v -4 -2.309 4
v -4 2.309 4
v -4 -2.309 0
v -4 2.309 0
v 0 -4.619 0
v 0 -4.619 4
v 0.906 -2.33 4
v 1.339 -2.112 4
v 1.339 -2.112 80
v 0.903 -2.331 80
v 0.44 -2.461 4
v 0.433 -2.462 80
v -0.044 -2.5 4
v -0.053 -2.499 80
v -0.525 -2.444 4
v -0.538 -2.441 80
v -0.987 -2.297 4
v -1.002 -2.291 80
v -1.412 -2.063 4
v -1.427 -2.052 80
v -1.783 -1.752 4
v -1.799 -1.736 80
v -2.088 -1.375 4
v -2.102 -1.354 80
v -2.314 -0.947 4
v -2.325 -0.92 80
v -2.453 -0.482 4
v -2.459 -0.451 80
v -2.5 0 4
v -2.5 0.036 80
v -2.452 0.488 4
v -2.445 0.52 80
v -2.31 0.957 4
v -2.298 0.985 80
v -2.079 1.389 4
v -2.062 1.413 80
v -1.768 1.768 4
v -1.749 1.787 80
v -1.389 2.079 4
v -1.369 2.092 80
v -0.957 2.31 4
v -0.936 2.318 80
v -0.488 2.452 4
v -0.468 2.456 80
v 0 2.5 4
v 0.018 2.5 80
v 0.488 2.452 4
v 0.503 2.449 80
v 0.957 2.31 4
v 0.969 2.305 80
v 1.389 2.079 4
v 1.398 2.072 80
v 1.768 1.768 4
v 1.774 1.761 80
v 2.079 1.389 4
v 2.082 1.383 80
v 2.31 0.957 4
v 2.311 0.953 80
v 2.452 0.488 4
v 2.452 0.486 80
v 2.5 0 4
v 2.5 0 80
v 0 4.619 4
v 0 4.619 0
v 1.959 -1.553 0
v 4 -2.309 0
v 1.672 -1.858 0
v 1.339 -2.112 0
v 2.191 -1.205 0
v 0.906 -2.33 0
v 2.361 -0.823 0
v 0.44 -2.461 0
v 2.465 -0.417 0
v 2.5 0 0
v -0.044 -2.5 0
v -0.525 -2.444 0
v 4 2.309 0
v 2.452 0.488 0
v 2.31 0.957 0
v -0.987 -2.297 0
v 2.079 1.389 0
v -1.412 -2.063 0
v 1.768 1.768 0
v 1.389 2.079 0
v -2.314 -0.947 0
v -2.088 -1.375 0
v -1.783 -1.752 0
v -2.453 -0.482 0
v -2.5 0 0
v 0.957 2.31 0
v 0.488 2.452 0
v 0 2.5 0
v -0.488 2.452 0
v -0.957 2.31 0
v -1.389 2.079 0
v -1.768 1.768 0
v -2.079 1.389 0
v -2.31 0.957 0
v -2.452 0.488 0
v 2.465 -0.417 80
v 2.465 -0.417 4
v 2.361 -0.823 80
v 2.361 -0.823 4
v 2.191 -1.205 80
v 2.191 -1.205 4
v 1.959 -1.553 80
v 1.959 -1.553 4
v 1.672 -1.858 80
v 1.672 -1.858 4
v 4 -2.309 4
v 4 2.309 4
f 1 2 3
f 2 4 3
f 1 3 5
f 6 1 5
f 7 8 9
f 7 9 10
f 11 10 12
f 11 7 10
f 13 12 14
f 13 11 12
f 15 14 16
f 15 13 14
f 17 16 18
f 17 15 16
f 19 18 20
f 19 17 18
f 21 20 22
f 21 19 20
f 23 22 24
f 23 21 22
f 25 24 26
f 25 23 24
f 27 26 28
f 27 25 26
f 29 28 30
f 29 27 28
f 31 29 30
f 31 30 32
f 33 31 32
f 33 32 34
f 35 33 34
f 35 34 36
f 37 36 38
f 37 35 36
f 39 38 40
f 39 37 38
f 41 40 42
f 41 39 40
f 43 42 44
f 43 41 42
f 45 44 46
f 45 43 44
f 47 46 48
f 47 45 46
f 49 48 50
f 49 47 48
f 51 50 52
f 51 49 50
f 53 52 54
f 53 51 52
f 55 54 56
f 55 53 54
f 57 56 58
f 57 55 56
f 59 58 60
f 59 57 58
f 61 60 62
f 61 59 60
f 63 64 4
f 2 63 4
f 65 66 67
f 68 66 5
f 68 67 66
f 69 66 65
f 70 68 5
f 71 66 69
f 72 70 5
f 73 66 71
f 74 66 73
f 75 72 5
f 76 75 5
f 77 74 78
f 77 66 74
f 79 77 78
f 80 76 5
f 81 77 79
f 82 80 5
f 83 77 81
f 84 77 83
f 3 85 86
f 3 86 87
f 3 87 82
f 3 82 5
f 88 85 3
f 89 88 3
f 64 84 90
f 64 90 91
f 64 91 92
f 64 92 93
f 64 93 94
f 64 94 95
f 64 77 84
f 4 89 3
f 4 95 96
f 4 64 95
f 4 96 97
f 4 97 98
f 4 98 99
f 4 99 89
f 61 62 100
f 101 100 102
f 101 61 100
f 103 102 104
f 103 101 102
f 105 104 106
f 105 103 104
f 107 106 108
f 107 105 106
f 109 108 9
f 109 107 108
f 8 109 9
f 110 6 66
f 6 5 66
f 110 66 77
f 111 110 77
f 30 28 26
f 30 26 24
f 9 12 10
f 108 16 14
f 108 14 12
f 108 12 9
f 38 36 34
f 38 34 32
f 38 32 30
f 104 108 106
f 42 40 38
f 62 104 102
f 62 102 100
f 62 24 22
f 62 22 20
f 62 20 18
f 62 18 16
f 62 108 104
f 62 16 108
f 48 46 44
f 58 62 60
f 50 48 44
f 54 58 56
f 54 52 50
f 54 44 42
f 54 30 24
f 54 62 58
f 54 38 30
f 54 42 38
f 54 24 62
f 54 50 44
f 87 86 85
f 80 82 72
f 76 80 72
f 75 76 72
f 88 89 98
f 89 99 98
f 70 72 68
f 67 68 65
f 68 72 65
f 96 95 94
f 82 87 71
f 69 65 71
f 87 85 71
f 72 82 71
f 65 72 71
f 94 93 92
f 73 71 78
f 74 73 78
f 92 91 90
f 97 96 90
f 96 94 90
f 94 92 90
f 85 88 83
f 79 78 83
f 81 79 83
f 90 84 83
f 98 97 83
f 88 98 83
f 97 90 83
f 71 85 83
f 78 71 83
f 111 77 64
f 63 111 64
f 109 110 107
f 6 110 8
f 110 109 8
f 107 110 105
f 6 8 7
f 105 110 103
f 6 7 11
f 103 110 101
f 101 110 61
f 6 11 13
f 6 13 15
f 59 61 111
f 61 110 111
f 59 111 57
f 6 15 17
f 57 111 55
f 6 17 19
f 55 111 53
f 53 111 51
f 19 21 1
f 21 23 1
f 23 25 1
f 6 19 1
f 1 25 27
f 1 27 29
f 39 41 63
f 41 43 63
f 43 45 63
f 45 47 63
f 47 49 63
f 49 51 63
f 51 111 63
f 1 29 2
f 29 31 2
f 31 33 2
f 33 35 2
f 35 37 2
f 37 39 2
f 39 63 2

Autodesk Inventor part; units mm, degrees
ref_plane "YZ Plane" through (0, 0, 0) normal (1, 0, 0) x (0, 1, 0)
ref_plane "XZ Plane" through (0, 0, 0) normal (0, 1, 0) x (-1, 0, 0)
ref_plane "XY Plane" through (0, 0, 0) normal (0, 0, 1) x (1, 0, 0)
sketch "Sketch1" plane through (0, 0, 0) normal (0, 0, 1) x (1, 0, 0)
  circle A0 centre (0, 0) radius 2.5
  line L0 (1.3379, -2.1119) -> (1.34, -2.1119)
  point P0 (-1.3379, -2.1119)
  dimension "d0" = 5
extrude "Extrusion1" add sketch "Sketch1" along normal blind 80
sketch "Sketch2" plane through (0, 0, 0) normal (0, 0, -1) x (-1, 0, 0)
  circle A0 centre (0, 0) radius 2.5 projected
  line L0 (0, -4.6188) -> (-4, -2.3094)
  line L1 (-4, -2.3094) -> (-4, 2.3094)
  line L2 (-4, 2.3094) -> (0, 4.6188)
  line L3 (0, 4.6188) -> (4, 2.3094)
  line L4 (4, 2.3094) -> (4, -2.3094)
  line L5 (4, -2.3094) -> (0, -4.6188)
  dimension "d4" = 8
extrude "Extrusion2" add sketch "Sketch2" against normal blind 4
properties part number "quarter-inch-rod" material "Iron, Cast"
